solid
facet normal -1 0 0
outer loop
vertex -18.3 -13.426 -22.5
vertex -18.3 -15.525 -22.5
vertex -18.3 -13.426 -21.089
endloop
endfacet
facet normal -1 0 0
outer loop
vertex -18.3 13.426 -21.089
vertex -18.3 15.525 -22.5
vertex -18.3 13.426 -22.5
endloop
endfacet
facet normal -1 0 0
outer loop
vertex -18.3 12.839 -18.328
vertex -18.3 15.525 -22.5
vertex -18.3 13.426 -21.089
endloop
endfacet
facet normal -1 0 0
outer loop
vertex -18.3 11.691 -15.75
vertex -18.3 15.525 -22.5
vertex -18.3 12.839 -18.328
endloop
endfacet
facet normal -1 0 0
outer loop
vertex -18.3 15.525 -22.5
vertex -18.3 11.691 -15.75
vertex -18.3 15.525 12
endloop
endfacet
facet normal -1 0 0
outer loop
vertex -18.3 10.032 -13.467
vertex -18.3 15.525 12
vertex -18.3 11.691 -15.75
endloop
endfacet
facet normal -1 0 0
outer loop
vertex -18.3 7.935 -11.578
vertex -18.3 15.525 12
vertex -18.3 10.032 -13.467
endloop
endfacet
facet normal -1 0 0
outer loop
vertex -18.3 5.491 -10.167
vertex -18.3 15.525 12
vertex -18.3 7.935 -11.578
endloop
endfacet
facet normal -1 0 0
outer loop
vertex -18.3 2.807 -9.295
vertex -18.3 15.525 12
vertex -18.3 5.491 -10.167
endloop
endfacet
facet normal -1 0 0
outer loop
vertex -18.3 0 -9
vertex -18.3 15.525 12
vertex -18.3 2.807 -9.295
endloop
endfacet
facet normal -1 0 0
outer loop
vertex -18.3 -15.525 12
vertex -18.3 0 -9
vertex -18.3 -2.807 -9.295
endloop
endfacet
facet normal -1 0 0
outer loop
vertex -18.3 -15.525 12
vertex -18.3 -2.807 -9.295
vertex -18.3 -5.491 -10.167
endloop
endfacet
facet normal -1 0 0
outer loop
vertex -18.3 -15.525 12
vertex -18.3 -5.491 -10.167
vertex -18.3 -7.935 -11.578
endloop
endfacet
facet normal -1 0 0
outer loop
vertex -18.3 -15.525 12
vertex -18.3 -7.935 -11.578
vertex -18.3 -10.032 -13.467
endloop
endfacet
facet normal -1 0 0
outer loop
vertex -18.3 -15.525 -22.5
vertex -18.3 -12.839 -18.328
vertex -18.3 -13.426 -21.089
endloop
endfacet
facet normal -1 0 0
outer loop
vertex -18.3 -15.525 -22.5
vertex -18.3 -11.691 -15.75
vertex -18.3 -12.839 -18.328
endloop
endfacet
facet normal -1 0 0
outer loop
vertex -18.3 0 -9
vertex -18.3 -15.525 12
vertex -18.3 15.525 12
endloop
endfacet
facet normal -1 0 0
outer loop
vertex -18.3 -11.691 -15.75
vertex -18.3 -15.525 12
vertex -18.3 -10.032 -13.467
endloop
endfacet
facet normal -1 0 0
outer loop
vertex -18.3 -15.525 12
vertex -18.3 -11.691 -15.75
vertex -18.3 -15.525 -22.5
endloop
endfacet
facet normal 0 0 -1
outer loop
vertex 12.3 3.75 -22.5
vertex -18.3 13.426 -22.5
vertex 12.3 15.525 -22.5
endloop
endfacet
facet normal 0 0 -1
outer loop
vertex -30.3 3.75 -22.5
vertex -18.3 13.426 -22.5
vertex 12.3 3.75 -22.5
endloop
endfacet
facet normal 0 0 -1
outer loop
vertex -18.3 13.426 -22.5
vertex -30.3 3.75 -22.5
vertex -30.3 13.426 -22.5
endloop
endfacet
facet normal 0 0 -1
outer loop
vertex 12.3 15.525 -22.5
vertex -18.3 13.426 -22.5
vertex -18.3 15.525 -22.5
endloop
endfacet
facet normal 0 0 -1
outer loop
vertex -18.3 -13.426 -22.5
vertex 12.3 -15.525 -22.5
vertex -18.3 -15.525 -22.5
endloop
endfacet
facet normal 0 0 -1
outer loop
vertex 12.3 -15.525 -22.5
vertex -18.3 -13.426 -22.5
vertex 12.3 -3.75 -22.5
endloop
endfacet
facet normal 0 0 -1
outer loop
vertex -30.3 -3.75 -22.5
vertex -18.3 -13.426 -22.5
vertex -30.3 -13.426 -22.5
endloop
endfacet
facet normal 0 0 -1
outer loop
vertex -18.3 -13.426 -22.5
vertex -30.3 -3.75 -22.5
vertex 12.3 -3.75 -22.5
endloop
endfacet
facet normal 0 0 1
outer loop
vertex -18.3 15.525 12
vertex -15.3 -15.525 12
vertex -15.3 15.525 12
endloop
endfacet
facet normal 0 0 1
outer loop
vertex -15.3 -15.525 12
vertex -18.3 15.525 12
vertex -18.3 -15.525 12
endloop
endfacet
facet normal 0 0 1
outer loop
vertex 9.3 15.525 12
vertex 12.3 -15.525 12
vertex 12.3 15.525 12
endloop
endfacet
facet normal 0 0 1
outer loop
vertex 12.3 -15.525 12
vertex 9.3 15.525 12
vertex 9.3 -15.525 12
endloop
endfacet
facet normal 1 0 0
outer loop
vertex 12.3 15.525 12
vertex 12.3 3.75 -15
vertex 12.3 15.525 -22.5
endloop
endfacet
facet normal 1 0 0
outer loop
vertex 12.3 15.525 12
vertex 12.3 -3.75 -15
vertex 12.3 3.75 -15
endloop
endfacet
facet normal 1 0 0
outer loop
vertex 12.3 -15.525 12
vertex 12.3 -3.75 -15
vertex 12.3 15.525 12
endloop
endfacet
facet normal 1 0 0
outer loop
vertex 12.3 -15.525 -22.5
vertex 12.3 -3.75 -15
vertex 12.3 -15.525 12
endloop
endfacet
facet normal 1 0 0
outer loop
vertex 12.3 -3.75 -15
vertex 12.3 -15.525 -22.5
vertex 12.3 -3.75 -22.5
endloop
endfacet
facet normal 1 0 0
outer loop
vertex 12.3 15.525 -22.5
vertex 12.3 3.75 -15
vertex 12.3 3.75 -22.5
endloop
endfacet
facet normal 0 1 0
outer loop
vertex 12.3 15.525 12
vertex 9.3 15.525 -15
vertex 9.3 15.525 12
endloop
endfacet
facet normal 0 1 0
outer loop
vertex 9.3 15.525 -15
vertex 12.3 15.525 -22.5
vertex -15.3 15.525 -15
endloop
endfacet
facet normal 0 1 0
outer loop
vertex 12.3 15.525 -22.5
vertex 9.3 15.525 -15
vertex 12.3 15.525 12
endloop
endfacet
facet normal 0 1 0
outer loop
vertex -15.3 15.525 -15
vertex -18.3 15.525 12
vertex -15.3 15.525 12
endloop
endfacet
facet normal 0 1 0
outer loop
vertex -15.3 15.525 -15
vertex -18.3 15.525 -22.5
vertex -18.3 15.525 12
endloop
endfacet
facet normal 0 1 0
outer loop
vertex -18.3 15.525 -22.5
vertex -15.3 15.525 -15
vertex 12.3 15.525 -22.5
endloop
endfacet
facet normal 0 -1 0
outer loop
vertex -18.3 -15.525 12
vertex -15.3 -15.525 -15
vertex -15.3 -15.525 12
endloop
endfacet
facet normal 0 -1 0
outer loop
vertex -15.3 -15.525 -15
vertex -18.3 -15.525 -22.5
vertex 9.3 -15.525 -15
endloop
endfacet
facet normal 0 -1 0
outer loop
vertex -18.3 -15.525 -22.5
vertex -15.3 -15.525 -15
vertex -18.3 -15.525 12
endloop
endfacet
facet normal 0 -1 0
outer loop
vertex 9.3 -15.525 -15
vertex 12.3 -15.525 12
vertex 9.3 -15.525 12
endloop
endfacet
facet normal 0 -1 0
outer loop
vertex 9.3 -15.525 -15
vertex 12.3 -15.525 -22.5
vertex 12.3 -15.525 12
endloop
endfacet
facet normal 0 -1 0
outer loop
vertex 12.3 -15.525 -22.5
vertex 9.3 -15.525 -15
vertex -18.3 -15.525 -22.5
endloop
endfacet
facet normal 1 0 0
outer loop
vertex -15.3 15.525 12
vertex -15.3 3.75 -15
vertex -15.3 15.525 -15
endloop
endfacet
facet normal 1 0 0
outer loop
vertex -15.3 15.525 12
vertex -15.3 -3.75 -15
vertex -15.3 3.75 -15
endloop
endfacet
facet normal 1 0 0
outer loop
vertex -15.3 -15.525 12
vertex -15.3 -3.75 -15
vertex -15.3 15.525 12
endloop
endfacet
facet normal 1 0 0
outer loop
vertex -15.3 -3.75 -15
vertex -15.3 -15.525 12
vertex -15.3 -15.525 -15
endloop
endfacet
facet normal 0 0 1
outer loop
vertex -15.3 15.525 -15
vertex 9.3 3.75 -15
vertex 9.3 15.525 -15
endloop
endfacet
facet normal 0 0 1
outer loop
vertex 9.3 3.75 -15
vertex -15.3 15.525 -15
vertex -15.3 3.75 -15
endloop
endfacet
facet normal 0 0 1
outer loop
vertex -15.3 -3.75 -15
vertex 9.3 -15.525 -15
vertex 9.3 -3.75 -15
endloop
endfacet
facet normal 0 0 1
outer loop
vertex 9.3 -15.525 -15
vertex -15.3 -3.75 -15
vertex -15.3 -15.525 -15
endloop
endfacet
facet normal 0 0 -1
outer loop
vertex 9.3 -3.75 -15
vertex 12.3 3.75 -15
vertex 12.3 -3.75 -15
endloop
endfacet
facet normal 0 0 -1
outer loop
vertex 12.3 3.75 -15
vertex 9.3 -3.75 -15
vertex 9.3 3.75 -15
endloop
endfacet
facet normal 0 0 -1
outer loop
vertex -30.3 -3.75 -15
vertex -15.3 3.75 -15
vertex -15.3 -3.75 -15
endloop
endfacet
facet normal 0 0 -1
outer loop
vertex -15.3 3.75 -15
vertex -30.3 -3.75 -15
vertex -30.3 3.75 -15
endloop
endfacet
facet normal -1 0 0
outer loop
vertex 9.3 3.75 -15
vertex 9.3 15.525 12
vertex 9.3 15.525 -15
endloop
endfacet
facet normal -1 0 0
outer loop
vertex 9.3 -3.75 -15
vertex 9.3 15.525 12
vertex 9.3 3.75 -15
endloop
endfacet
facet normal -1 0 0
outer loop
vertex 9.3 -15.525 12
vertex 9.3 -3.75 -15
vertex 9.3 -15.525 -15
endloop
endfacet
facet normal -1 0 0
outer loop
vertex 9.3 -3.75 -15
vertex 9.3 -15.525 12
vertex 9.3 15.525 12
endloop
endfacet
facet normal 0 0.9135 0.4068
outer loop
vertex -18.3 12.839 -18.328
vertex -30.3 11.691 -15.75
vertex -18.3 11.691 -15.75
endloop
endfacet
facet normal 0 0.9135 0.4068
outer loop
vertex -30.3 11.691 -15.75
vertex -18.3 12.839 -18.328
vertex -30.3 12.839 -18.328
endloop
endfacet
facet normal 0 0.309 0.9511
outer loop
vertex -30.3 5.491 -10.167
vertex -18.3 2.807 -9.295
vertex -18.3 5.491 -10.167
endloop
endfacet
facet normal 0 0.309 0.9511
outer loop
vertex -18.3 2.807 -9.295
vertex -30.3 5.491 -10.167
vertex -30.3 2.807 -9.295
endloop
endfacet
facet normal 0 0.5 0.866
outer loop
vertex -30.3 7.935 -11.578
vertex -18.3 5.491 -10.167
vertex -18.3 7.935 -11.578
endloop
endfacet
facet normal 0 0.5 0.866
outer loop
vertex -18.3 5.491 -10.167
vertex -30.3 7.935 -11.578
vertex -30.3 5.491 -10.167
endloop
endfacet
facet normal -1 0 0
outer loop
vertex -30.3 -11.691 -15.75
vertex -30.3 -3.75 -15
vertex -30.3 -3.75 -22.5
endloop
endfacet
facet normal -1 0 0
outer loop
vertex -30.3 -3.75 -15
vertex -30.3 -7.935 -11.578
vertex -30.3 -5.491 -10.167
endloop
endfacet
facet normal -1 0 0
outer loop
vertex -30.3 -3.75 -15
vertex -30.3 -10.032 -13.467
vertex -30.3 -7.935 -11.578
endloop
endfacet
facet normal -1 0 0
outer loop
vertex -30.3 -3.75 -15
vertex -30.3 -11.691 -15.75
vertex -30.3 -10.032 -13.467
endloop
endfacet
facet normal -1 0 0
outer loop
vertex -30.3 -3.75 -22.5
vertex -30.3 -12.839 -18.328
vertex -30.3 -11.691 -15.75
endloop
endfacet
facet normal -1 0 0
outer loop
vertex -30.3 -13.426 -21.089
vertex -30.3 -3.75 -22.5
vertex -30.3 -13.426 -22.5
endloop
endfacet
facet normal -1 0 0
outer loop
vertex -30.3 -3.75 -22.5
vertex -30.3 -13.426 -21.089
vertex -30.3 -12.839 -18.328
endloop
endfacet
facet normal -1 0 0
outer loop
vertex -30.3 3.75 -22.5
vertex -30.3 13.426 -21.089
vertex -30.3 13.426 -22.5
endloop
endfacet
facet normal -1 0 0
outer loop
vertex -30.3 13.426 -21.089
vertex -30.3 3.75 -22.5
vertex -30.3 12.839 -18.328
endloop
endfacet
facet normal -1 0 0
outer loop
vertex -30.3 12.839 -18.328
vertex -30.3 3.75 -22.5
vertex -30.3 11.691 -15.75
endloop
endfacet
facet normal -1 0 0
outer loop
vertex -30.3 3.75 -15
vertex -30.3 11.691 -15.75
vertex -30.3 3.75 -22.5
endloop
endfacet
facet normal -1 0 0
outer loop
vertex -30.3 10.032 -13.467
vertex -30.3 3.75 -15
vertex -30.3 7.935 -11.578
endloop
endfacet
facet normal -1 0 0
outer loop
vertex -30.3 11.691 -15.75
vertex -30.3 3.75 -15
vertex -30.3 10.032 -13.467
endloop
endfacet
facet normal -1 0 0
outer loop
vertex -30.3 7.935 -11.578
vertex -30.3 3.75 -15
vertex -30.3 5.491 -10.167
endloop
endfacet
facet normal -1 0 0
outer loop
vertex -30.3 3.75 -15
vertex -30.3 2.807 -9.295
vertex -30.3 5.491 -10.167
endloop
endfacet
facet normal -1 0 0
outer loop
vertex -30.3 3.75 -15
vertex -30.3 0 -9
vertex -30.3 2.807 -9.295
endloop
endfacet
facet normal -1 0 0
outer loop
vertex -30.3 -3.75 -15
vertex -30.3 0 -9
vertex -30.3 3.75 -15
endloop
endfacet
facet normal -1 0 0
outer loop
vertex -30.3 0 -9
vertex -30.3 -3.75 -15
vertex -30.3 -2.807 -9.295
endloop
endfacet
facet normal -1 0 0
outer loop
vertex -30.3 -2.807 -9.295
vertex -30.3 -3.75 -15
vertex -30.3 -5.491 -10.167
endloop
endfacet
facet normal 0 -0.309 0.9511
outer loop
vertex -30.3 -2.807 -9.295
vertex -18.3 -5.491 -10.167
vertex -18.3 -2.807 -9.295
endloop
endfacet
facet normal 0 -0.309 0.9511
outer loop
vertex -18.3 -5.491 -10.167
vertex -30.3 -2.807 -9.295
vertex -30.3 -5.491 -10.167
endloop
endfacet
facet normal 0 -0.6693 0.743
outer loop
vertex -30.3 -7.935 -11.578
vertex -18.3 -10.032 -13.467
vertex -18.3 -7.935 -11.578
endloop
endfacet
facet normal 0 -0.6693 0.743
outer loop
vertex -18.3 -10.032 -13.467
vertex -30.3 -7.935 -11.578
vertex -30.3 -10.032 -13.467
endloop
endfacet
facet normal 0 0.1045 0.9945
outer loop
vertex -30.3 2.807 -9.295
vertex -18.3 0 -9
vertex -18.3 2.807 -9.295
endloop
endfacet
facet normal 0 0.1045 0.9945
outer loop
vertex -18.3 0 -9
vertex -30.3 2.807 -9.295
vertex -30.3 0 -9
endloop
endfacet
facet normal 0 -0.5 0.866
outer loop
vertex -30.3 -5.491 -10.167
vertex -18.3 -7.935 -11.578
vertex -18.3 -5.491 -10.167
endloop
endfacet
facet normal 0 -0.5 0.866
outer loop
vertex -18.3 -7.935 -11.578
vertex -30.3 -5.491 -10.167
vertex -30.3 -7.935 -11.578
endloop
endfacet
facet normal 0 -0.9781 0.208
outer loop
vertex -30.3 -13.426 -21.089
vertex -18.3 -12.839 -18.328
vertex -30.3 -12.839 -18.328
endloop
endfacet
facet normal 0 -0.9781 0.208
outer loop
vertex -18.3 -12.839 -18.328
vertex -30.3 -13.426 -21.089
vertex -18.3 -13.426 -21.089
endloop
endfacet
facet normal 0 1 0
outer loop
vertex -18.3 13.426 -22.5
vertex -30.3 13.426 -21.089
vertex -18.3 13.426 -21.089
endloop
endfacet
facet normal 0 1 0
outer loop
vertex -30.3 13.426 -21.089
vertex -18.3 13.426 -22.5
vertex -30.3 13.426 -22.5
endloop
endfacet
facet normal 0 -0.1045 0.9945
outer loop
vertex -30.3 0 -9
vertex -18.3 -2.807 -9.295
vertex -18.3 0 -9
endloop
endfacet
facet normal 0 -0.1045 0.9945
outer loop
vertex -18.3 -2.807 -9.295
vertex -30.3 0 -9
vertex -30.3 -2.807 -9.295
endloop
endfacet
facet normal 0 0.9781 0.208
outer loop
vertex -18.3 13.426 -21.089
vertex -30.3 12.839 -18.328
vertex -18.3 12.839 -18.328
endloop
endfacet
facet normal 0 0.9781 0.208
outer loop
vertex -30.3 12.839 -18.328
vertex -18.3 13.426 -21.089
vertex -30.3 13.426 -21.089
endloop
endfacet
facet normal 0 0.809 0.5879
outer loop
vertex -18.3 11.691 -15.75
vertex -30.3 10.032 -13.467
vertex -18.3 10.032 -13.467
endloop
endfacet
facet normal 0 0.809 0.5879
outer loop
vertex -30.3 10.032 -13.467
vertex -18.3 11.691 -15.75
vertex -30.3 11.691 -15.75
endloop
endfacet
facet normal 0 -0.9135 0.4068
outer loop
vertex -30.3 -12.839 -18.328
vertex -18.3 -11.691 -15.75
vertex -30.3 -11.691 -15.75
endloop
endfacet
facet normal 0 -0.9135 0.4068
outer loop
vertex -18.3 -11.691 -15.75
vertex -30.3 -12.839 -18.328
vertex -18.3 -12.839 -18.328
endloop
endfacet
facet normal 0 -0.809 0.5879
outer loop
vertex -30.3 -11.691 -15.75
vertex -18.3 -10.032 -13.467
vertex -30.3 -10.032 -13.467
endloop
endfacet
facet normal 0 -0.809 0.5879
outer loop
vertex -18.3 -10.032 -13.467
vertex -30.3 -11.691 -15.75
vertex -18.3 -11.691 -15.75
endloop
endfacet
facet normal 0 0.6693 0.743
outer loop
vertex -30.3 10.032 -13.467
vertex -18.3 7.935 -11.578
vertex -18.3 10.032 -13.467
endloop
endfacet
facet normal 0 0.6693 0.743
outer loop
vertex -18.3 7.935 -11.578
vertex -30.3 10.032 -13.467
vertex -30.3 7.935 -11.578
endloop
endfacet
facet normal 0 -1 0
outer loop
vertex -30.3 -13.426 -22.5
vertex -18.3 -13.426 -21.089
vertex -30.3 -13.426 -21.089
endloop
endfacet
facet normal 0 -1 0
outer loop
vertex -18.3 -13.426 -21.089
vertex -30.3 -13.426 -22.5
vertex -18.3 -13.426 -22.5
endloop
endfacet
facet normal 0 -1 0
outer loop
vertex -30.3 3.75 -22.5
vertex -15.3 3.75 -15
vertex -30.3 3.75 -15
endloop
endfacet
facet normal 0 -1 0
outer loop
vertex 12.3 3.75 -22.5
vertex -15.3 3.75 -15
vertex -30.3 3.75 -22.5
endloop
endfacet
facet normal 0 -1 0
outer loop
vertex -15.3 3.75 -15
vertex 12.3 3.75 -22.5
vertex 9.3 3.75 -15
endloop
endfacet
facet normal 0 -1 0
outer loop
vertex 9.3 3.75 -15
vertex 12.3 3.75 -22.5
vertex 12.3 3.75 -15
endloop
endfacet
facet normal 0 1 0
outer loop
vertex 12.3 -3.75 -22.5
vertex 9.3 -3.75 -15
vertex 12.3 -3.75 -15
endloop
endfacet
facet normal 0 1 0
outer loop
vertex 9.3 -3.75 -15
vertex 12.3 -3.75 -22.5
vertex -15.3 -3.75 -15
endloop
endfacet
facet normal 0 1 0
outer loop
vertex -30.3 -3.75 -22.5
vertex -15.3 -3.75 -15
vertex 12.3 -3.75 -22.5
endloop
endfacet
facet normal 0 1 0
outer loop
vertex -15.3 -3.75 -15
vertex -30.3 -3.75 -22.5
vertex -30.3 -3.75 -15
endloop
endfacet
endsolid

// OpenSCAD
// Cable Holder by xifle
// 12.08.2013
// v2

// preview[view:north, tilt:top diagonal]
/* [Global] */


// The thickness of the table [mm]
TABLE_HEIGHT = 24.6;

// The depth of the cable holder [mm]
DEPTH = 30;

// diameter of the cable to hold, some space will be added [mm]
CABLE = 6;

// height of the cylinder on top of the cable holder clip [mm]
CYLINDER_HEIGHT = 12;

// wall thickness [mm]
WALL = 3;

// space between table and wall, this will be at least the thickness of the cable (plus 1.5mm spacing) [mm]
WALLTABLESPACE = 3;

/* [Hidden] */

// additional space for cable
CABLEWSPACE = CABLE+1.5;

$fs = 0.01;
ADDSPACE = max(max(WALLTABLESPACE,CABLEWSPACE),WALL)-WALL;

//ADDSPACE = WALLTABLESPACE-WALL;
OUTER_RADIUS = CABLEWSPACE*1.8;
WIDTH = OUTER_RADIUS*2.3;

rotate([0,180,0])
difference() {
union() {

	translate([TABLE_HEIGHT/2+2*WALL+CYLINDER_HEIGHT/2,0,DEPTH/2+WALL+ADDSPACE])
	rotate([0,90,0])
	cylinder(h=CYLINDER_HEIGHT, r=OUTER_RADIUS, center=true);


	difference() {

	translate([WALL,0,WALL+ADDSPACE/2])
	cube([TABLE_HEIGHT+2*WALL, WIDTH, DEPTH+ADDSPACE ], center=true);

	translate([WALL, WALL,0])
	cube([TABLE_HEIGHT, WIDTH*2, DEPTH], center=true);

	}

}

translate([0,0,DEPTH/2+WALL+OUTER_RADIUS+ADDSPACE])
cube([(TABLE_HEIGHT+2*WALL+CYLINDER_HEIGHT)*2, WIDTH, 2*OUTER_RADIUS], center=true);

translate([0,0,DEPTH/2+WALL+ADDSPACE])
cube([(TABLE_HEIGHT+2*WALL+CYLINDER_HEIGHT)*2, CABLEWSPACE, CABLEWSPACE*2], center=true);

}
